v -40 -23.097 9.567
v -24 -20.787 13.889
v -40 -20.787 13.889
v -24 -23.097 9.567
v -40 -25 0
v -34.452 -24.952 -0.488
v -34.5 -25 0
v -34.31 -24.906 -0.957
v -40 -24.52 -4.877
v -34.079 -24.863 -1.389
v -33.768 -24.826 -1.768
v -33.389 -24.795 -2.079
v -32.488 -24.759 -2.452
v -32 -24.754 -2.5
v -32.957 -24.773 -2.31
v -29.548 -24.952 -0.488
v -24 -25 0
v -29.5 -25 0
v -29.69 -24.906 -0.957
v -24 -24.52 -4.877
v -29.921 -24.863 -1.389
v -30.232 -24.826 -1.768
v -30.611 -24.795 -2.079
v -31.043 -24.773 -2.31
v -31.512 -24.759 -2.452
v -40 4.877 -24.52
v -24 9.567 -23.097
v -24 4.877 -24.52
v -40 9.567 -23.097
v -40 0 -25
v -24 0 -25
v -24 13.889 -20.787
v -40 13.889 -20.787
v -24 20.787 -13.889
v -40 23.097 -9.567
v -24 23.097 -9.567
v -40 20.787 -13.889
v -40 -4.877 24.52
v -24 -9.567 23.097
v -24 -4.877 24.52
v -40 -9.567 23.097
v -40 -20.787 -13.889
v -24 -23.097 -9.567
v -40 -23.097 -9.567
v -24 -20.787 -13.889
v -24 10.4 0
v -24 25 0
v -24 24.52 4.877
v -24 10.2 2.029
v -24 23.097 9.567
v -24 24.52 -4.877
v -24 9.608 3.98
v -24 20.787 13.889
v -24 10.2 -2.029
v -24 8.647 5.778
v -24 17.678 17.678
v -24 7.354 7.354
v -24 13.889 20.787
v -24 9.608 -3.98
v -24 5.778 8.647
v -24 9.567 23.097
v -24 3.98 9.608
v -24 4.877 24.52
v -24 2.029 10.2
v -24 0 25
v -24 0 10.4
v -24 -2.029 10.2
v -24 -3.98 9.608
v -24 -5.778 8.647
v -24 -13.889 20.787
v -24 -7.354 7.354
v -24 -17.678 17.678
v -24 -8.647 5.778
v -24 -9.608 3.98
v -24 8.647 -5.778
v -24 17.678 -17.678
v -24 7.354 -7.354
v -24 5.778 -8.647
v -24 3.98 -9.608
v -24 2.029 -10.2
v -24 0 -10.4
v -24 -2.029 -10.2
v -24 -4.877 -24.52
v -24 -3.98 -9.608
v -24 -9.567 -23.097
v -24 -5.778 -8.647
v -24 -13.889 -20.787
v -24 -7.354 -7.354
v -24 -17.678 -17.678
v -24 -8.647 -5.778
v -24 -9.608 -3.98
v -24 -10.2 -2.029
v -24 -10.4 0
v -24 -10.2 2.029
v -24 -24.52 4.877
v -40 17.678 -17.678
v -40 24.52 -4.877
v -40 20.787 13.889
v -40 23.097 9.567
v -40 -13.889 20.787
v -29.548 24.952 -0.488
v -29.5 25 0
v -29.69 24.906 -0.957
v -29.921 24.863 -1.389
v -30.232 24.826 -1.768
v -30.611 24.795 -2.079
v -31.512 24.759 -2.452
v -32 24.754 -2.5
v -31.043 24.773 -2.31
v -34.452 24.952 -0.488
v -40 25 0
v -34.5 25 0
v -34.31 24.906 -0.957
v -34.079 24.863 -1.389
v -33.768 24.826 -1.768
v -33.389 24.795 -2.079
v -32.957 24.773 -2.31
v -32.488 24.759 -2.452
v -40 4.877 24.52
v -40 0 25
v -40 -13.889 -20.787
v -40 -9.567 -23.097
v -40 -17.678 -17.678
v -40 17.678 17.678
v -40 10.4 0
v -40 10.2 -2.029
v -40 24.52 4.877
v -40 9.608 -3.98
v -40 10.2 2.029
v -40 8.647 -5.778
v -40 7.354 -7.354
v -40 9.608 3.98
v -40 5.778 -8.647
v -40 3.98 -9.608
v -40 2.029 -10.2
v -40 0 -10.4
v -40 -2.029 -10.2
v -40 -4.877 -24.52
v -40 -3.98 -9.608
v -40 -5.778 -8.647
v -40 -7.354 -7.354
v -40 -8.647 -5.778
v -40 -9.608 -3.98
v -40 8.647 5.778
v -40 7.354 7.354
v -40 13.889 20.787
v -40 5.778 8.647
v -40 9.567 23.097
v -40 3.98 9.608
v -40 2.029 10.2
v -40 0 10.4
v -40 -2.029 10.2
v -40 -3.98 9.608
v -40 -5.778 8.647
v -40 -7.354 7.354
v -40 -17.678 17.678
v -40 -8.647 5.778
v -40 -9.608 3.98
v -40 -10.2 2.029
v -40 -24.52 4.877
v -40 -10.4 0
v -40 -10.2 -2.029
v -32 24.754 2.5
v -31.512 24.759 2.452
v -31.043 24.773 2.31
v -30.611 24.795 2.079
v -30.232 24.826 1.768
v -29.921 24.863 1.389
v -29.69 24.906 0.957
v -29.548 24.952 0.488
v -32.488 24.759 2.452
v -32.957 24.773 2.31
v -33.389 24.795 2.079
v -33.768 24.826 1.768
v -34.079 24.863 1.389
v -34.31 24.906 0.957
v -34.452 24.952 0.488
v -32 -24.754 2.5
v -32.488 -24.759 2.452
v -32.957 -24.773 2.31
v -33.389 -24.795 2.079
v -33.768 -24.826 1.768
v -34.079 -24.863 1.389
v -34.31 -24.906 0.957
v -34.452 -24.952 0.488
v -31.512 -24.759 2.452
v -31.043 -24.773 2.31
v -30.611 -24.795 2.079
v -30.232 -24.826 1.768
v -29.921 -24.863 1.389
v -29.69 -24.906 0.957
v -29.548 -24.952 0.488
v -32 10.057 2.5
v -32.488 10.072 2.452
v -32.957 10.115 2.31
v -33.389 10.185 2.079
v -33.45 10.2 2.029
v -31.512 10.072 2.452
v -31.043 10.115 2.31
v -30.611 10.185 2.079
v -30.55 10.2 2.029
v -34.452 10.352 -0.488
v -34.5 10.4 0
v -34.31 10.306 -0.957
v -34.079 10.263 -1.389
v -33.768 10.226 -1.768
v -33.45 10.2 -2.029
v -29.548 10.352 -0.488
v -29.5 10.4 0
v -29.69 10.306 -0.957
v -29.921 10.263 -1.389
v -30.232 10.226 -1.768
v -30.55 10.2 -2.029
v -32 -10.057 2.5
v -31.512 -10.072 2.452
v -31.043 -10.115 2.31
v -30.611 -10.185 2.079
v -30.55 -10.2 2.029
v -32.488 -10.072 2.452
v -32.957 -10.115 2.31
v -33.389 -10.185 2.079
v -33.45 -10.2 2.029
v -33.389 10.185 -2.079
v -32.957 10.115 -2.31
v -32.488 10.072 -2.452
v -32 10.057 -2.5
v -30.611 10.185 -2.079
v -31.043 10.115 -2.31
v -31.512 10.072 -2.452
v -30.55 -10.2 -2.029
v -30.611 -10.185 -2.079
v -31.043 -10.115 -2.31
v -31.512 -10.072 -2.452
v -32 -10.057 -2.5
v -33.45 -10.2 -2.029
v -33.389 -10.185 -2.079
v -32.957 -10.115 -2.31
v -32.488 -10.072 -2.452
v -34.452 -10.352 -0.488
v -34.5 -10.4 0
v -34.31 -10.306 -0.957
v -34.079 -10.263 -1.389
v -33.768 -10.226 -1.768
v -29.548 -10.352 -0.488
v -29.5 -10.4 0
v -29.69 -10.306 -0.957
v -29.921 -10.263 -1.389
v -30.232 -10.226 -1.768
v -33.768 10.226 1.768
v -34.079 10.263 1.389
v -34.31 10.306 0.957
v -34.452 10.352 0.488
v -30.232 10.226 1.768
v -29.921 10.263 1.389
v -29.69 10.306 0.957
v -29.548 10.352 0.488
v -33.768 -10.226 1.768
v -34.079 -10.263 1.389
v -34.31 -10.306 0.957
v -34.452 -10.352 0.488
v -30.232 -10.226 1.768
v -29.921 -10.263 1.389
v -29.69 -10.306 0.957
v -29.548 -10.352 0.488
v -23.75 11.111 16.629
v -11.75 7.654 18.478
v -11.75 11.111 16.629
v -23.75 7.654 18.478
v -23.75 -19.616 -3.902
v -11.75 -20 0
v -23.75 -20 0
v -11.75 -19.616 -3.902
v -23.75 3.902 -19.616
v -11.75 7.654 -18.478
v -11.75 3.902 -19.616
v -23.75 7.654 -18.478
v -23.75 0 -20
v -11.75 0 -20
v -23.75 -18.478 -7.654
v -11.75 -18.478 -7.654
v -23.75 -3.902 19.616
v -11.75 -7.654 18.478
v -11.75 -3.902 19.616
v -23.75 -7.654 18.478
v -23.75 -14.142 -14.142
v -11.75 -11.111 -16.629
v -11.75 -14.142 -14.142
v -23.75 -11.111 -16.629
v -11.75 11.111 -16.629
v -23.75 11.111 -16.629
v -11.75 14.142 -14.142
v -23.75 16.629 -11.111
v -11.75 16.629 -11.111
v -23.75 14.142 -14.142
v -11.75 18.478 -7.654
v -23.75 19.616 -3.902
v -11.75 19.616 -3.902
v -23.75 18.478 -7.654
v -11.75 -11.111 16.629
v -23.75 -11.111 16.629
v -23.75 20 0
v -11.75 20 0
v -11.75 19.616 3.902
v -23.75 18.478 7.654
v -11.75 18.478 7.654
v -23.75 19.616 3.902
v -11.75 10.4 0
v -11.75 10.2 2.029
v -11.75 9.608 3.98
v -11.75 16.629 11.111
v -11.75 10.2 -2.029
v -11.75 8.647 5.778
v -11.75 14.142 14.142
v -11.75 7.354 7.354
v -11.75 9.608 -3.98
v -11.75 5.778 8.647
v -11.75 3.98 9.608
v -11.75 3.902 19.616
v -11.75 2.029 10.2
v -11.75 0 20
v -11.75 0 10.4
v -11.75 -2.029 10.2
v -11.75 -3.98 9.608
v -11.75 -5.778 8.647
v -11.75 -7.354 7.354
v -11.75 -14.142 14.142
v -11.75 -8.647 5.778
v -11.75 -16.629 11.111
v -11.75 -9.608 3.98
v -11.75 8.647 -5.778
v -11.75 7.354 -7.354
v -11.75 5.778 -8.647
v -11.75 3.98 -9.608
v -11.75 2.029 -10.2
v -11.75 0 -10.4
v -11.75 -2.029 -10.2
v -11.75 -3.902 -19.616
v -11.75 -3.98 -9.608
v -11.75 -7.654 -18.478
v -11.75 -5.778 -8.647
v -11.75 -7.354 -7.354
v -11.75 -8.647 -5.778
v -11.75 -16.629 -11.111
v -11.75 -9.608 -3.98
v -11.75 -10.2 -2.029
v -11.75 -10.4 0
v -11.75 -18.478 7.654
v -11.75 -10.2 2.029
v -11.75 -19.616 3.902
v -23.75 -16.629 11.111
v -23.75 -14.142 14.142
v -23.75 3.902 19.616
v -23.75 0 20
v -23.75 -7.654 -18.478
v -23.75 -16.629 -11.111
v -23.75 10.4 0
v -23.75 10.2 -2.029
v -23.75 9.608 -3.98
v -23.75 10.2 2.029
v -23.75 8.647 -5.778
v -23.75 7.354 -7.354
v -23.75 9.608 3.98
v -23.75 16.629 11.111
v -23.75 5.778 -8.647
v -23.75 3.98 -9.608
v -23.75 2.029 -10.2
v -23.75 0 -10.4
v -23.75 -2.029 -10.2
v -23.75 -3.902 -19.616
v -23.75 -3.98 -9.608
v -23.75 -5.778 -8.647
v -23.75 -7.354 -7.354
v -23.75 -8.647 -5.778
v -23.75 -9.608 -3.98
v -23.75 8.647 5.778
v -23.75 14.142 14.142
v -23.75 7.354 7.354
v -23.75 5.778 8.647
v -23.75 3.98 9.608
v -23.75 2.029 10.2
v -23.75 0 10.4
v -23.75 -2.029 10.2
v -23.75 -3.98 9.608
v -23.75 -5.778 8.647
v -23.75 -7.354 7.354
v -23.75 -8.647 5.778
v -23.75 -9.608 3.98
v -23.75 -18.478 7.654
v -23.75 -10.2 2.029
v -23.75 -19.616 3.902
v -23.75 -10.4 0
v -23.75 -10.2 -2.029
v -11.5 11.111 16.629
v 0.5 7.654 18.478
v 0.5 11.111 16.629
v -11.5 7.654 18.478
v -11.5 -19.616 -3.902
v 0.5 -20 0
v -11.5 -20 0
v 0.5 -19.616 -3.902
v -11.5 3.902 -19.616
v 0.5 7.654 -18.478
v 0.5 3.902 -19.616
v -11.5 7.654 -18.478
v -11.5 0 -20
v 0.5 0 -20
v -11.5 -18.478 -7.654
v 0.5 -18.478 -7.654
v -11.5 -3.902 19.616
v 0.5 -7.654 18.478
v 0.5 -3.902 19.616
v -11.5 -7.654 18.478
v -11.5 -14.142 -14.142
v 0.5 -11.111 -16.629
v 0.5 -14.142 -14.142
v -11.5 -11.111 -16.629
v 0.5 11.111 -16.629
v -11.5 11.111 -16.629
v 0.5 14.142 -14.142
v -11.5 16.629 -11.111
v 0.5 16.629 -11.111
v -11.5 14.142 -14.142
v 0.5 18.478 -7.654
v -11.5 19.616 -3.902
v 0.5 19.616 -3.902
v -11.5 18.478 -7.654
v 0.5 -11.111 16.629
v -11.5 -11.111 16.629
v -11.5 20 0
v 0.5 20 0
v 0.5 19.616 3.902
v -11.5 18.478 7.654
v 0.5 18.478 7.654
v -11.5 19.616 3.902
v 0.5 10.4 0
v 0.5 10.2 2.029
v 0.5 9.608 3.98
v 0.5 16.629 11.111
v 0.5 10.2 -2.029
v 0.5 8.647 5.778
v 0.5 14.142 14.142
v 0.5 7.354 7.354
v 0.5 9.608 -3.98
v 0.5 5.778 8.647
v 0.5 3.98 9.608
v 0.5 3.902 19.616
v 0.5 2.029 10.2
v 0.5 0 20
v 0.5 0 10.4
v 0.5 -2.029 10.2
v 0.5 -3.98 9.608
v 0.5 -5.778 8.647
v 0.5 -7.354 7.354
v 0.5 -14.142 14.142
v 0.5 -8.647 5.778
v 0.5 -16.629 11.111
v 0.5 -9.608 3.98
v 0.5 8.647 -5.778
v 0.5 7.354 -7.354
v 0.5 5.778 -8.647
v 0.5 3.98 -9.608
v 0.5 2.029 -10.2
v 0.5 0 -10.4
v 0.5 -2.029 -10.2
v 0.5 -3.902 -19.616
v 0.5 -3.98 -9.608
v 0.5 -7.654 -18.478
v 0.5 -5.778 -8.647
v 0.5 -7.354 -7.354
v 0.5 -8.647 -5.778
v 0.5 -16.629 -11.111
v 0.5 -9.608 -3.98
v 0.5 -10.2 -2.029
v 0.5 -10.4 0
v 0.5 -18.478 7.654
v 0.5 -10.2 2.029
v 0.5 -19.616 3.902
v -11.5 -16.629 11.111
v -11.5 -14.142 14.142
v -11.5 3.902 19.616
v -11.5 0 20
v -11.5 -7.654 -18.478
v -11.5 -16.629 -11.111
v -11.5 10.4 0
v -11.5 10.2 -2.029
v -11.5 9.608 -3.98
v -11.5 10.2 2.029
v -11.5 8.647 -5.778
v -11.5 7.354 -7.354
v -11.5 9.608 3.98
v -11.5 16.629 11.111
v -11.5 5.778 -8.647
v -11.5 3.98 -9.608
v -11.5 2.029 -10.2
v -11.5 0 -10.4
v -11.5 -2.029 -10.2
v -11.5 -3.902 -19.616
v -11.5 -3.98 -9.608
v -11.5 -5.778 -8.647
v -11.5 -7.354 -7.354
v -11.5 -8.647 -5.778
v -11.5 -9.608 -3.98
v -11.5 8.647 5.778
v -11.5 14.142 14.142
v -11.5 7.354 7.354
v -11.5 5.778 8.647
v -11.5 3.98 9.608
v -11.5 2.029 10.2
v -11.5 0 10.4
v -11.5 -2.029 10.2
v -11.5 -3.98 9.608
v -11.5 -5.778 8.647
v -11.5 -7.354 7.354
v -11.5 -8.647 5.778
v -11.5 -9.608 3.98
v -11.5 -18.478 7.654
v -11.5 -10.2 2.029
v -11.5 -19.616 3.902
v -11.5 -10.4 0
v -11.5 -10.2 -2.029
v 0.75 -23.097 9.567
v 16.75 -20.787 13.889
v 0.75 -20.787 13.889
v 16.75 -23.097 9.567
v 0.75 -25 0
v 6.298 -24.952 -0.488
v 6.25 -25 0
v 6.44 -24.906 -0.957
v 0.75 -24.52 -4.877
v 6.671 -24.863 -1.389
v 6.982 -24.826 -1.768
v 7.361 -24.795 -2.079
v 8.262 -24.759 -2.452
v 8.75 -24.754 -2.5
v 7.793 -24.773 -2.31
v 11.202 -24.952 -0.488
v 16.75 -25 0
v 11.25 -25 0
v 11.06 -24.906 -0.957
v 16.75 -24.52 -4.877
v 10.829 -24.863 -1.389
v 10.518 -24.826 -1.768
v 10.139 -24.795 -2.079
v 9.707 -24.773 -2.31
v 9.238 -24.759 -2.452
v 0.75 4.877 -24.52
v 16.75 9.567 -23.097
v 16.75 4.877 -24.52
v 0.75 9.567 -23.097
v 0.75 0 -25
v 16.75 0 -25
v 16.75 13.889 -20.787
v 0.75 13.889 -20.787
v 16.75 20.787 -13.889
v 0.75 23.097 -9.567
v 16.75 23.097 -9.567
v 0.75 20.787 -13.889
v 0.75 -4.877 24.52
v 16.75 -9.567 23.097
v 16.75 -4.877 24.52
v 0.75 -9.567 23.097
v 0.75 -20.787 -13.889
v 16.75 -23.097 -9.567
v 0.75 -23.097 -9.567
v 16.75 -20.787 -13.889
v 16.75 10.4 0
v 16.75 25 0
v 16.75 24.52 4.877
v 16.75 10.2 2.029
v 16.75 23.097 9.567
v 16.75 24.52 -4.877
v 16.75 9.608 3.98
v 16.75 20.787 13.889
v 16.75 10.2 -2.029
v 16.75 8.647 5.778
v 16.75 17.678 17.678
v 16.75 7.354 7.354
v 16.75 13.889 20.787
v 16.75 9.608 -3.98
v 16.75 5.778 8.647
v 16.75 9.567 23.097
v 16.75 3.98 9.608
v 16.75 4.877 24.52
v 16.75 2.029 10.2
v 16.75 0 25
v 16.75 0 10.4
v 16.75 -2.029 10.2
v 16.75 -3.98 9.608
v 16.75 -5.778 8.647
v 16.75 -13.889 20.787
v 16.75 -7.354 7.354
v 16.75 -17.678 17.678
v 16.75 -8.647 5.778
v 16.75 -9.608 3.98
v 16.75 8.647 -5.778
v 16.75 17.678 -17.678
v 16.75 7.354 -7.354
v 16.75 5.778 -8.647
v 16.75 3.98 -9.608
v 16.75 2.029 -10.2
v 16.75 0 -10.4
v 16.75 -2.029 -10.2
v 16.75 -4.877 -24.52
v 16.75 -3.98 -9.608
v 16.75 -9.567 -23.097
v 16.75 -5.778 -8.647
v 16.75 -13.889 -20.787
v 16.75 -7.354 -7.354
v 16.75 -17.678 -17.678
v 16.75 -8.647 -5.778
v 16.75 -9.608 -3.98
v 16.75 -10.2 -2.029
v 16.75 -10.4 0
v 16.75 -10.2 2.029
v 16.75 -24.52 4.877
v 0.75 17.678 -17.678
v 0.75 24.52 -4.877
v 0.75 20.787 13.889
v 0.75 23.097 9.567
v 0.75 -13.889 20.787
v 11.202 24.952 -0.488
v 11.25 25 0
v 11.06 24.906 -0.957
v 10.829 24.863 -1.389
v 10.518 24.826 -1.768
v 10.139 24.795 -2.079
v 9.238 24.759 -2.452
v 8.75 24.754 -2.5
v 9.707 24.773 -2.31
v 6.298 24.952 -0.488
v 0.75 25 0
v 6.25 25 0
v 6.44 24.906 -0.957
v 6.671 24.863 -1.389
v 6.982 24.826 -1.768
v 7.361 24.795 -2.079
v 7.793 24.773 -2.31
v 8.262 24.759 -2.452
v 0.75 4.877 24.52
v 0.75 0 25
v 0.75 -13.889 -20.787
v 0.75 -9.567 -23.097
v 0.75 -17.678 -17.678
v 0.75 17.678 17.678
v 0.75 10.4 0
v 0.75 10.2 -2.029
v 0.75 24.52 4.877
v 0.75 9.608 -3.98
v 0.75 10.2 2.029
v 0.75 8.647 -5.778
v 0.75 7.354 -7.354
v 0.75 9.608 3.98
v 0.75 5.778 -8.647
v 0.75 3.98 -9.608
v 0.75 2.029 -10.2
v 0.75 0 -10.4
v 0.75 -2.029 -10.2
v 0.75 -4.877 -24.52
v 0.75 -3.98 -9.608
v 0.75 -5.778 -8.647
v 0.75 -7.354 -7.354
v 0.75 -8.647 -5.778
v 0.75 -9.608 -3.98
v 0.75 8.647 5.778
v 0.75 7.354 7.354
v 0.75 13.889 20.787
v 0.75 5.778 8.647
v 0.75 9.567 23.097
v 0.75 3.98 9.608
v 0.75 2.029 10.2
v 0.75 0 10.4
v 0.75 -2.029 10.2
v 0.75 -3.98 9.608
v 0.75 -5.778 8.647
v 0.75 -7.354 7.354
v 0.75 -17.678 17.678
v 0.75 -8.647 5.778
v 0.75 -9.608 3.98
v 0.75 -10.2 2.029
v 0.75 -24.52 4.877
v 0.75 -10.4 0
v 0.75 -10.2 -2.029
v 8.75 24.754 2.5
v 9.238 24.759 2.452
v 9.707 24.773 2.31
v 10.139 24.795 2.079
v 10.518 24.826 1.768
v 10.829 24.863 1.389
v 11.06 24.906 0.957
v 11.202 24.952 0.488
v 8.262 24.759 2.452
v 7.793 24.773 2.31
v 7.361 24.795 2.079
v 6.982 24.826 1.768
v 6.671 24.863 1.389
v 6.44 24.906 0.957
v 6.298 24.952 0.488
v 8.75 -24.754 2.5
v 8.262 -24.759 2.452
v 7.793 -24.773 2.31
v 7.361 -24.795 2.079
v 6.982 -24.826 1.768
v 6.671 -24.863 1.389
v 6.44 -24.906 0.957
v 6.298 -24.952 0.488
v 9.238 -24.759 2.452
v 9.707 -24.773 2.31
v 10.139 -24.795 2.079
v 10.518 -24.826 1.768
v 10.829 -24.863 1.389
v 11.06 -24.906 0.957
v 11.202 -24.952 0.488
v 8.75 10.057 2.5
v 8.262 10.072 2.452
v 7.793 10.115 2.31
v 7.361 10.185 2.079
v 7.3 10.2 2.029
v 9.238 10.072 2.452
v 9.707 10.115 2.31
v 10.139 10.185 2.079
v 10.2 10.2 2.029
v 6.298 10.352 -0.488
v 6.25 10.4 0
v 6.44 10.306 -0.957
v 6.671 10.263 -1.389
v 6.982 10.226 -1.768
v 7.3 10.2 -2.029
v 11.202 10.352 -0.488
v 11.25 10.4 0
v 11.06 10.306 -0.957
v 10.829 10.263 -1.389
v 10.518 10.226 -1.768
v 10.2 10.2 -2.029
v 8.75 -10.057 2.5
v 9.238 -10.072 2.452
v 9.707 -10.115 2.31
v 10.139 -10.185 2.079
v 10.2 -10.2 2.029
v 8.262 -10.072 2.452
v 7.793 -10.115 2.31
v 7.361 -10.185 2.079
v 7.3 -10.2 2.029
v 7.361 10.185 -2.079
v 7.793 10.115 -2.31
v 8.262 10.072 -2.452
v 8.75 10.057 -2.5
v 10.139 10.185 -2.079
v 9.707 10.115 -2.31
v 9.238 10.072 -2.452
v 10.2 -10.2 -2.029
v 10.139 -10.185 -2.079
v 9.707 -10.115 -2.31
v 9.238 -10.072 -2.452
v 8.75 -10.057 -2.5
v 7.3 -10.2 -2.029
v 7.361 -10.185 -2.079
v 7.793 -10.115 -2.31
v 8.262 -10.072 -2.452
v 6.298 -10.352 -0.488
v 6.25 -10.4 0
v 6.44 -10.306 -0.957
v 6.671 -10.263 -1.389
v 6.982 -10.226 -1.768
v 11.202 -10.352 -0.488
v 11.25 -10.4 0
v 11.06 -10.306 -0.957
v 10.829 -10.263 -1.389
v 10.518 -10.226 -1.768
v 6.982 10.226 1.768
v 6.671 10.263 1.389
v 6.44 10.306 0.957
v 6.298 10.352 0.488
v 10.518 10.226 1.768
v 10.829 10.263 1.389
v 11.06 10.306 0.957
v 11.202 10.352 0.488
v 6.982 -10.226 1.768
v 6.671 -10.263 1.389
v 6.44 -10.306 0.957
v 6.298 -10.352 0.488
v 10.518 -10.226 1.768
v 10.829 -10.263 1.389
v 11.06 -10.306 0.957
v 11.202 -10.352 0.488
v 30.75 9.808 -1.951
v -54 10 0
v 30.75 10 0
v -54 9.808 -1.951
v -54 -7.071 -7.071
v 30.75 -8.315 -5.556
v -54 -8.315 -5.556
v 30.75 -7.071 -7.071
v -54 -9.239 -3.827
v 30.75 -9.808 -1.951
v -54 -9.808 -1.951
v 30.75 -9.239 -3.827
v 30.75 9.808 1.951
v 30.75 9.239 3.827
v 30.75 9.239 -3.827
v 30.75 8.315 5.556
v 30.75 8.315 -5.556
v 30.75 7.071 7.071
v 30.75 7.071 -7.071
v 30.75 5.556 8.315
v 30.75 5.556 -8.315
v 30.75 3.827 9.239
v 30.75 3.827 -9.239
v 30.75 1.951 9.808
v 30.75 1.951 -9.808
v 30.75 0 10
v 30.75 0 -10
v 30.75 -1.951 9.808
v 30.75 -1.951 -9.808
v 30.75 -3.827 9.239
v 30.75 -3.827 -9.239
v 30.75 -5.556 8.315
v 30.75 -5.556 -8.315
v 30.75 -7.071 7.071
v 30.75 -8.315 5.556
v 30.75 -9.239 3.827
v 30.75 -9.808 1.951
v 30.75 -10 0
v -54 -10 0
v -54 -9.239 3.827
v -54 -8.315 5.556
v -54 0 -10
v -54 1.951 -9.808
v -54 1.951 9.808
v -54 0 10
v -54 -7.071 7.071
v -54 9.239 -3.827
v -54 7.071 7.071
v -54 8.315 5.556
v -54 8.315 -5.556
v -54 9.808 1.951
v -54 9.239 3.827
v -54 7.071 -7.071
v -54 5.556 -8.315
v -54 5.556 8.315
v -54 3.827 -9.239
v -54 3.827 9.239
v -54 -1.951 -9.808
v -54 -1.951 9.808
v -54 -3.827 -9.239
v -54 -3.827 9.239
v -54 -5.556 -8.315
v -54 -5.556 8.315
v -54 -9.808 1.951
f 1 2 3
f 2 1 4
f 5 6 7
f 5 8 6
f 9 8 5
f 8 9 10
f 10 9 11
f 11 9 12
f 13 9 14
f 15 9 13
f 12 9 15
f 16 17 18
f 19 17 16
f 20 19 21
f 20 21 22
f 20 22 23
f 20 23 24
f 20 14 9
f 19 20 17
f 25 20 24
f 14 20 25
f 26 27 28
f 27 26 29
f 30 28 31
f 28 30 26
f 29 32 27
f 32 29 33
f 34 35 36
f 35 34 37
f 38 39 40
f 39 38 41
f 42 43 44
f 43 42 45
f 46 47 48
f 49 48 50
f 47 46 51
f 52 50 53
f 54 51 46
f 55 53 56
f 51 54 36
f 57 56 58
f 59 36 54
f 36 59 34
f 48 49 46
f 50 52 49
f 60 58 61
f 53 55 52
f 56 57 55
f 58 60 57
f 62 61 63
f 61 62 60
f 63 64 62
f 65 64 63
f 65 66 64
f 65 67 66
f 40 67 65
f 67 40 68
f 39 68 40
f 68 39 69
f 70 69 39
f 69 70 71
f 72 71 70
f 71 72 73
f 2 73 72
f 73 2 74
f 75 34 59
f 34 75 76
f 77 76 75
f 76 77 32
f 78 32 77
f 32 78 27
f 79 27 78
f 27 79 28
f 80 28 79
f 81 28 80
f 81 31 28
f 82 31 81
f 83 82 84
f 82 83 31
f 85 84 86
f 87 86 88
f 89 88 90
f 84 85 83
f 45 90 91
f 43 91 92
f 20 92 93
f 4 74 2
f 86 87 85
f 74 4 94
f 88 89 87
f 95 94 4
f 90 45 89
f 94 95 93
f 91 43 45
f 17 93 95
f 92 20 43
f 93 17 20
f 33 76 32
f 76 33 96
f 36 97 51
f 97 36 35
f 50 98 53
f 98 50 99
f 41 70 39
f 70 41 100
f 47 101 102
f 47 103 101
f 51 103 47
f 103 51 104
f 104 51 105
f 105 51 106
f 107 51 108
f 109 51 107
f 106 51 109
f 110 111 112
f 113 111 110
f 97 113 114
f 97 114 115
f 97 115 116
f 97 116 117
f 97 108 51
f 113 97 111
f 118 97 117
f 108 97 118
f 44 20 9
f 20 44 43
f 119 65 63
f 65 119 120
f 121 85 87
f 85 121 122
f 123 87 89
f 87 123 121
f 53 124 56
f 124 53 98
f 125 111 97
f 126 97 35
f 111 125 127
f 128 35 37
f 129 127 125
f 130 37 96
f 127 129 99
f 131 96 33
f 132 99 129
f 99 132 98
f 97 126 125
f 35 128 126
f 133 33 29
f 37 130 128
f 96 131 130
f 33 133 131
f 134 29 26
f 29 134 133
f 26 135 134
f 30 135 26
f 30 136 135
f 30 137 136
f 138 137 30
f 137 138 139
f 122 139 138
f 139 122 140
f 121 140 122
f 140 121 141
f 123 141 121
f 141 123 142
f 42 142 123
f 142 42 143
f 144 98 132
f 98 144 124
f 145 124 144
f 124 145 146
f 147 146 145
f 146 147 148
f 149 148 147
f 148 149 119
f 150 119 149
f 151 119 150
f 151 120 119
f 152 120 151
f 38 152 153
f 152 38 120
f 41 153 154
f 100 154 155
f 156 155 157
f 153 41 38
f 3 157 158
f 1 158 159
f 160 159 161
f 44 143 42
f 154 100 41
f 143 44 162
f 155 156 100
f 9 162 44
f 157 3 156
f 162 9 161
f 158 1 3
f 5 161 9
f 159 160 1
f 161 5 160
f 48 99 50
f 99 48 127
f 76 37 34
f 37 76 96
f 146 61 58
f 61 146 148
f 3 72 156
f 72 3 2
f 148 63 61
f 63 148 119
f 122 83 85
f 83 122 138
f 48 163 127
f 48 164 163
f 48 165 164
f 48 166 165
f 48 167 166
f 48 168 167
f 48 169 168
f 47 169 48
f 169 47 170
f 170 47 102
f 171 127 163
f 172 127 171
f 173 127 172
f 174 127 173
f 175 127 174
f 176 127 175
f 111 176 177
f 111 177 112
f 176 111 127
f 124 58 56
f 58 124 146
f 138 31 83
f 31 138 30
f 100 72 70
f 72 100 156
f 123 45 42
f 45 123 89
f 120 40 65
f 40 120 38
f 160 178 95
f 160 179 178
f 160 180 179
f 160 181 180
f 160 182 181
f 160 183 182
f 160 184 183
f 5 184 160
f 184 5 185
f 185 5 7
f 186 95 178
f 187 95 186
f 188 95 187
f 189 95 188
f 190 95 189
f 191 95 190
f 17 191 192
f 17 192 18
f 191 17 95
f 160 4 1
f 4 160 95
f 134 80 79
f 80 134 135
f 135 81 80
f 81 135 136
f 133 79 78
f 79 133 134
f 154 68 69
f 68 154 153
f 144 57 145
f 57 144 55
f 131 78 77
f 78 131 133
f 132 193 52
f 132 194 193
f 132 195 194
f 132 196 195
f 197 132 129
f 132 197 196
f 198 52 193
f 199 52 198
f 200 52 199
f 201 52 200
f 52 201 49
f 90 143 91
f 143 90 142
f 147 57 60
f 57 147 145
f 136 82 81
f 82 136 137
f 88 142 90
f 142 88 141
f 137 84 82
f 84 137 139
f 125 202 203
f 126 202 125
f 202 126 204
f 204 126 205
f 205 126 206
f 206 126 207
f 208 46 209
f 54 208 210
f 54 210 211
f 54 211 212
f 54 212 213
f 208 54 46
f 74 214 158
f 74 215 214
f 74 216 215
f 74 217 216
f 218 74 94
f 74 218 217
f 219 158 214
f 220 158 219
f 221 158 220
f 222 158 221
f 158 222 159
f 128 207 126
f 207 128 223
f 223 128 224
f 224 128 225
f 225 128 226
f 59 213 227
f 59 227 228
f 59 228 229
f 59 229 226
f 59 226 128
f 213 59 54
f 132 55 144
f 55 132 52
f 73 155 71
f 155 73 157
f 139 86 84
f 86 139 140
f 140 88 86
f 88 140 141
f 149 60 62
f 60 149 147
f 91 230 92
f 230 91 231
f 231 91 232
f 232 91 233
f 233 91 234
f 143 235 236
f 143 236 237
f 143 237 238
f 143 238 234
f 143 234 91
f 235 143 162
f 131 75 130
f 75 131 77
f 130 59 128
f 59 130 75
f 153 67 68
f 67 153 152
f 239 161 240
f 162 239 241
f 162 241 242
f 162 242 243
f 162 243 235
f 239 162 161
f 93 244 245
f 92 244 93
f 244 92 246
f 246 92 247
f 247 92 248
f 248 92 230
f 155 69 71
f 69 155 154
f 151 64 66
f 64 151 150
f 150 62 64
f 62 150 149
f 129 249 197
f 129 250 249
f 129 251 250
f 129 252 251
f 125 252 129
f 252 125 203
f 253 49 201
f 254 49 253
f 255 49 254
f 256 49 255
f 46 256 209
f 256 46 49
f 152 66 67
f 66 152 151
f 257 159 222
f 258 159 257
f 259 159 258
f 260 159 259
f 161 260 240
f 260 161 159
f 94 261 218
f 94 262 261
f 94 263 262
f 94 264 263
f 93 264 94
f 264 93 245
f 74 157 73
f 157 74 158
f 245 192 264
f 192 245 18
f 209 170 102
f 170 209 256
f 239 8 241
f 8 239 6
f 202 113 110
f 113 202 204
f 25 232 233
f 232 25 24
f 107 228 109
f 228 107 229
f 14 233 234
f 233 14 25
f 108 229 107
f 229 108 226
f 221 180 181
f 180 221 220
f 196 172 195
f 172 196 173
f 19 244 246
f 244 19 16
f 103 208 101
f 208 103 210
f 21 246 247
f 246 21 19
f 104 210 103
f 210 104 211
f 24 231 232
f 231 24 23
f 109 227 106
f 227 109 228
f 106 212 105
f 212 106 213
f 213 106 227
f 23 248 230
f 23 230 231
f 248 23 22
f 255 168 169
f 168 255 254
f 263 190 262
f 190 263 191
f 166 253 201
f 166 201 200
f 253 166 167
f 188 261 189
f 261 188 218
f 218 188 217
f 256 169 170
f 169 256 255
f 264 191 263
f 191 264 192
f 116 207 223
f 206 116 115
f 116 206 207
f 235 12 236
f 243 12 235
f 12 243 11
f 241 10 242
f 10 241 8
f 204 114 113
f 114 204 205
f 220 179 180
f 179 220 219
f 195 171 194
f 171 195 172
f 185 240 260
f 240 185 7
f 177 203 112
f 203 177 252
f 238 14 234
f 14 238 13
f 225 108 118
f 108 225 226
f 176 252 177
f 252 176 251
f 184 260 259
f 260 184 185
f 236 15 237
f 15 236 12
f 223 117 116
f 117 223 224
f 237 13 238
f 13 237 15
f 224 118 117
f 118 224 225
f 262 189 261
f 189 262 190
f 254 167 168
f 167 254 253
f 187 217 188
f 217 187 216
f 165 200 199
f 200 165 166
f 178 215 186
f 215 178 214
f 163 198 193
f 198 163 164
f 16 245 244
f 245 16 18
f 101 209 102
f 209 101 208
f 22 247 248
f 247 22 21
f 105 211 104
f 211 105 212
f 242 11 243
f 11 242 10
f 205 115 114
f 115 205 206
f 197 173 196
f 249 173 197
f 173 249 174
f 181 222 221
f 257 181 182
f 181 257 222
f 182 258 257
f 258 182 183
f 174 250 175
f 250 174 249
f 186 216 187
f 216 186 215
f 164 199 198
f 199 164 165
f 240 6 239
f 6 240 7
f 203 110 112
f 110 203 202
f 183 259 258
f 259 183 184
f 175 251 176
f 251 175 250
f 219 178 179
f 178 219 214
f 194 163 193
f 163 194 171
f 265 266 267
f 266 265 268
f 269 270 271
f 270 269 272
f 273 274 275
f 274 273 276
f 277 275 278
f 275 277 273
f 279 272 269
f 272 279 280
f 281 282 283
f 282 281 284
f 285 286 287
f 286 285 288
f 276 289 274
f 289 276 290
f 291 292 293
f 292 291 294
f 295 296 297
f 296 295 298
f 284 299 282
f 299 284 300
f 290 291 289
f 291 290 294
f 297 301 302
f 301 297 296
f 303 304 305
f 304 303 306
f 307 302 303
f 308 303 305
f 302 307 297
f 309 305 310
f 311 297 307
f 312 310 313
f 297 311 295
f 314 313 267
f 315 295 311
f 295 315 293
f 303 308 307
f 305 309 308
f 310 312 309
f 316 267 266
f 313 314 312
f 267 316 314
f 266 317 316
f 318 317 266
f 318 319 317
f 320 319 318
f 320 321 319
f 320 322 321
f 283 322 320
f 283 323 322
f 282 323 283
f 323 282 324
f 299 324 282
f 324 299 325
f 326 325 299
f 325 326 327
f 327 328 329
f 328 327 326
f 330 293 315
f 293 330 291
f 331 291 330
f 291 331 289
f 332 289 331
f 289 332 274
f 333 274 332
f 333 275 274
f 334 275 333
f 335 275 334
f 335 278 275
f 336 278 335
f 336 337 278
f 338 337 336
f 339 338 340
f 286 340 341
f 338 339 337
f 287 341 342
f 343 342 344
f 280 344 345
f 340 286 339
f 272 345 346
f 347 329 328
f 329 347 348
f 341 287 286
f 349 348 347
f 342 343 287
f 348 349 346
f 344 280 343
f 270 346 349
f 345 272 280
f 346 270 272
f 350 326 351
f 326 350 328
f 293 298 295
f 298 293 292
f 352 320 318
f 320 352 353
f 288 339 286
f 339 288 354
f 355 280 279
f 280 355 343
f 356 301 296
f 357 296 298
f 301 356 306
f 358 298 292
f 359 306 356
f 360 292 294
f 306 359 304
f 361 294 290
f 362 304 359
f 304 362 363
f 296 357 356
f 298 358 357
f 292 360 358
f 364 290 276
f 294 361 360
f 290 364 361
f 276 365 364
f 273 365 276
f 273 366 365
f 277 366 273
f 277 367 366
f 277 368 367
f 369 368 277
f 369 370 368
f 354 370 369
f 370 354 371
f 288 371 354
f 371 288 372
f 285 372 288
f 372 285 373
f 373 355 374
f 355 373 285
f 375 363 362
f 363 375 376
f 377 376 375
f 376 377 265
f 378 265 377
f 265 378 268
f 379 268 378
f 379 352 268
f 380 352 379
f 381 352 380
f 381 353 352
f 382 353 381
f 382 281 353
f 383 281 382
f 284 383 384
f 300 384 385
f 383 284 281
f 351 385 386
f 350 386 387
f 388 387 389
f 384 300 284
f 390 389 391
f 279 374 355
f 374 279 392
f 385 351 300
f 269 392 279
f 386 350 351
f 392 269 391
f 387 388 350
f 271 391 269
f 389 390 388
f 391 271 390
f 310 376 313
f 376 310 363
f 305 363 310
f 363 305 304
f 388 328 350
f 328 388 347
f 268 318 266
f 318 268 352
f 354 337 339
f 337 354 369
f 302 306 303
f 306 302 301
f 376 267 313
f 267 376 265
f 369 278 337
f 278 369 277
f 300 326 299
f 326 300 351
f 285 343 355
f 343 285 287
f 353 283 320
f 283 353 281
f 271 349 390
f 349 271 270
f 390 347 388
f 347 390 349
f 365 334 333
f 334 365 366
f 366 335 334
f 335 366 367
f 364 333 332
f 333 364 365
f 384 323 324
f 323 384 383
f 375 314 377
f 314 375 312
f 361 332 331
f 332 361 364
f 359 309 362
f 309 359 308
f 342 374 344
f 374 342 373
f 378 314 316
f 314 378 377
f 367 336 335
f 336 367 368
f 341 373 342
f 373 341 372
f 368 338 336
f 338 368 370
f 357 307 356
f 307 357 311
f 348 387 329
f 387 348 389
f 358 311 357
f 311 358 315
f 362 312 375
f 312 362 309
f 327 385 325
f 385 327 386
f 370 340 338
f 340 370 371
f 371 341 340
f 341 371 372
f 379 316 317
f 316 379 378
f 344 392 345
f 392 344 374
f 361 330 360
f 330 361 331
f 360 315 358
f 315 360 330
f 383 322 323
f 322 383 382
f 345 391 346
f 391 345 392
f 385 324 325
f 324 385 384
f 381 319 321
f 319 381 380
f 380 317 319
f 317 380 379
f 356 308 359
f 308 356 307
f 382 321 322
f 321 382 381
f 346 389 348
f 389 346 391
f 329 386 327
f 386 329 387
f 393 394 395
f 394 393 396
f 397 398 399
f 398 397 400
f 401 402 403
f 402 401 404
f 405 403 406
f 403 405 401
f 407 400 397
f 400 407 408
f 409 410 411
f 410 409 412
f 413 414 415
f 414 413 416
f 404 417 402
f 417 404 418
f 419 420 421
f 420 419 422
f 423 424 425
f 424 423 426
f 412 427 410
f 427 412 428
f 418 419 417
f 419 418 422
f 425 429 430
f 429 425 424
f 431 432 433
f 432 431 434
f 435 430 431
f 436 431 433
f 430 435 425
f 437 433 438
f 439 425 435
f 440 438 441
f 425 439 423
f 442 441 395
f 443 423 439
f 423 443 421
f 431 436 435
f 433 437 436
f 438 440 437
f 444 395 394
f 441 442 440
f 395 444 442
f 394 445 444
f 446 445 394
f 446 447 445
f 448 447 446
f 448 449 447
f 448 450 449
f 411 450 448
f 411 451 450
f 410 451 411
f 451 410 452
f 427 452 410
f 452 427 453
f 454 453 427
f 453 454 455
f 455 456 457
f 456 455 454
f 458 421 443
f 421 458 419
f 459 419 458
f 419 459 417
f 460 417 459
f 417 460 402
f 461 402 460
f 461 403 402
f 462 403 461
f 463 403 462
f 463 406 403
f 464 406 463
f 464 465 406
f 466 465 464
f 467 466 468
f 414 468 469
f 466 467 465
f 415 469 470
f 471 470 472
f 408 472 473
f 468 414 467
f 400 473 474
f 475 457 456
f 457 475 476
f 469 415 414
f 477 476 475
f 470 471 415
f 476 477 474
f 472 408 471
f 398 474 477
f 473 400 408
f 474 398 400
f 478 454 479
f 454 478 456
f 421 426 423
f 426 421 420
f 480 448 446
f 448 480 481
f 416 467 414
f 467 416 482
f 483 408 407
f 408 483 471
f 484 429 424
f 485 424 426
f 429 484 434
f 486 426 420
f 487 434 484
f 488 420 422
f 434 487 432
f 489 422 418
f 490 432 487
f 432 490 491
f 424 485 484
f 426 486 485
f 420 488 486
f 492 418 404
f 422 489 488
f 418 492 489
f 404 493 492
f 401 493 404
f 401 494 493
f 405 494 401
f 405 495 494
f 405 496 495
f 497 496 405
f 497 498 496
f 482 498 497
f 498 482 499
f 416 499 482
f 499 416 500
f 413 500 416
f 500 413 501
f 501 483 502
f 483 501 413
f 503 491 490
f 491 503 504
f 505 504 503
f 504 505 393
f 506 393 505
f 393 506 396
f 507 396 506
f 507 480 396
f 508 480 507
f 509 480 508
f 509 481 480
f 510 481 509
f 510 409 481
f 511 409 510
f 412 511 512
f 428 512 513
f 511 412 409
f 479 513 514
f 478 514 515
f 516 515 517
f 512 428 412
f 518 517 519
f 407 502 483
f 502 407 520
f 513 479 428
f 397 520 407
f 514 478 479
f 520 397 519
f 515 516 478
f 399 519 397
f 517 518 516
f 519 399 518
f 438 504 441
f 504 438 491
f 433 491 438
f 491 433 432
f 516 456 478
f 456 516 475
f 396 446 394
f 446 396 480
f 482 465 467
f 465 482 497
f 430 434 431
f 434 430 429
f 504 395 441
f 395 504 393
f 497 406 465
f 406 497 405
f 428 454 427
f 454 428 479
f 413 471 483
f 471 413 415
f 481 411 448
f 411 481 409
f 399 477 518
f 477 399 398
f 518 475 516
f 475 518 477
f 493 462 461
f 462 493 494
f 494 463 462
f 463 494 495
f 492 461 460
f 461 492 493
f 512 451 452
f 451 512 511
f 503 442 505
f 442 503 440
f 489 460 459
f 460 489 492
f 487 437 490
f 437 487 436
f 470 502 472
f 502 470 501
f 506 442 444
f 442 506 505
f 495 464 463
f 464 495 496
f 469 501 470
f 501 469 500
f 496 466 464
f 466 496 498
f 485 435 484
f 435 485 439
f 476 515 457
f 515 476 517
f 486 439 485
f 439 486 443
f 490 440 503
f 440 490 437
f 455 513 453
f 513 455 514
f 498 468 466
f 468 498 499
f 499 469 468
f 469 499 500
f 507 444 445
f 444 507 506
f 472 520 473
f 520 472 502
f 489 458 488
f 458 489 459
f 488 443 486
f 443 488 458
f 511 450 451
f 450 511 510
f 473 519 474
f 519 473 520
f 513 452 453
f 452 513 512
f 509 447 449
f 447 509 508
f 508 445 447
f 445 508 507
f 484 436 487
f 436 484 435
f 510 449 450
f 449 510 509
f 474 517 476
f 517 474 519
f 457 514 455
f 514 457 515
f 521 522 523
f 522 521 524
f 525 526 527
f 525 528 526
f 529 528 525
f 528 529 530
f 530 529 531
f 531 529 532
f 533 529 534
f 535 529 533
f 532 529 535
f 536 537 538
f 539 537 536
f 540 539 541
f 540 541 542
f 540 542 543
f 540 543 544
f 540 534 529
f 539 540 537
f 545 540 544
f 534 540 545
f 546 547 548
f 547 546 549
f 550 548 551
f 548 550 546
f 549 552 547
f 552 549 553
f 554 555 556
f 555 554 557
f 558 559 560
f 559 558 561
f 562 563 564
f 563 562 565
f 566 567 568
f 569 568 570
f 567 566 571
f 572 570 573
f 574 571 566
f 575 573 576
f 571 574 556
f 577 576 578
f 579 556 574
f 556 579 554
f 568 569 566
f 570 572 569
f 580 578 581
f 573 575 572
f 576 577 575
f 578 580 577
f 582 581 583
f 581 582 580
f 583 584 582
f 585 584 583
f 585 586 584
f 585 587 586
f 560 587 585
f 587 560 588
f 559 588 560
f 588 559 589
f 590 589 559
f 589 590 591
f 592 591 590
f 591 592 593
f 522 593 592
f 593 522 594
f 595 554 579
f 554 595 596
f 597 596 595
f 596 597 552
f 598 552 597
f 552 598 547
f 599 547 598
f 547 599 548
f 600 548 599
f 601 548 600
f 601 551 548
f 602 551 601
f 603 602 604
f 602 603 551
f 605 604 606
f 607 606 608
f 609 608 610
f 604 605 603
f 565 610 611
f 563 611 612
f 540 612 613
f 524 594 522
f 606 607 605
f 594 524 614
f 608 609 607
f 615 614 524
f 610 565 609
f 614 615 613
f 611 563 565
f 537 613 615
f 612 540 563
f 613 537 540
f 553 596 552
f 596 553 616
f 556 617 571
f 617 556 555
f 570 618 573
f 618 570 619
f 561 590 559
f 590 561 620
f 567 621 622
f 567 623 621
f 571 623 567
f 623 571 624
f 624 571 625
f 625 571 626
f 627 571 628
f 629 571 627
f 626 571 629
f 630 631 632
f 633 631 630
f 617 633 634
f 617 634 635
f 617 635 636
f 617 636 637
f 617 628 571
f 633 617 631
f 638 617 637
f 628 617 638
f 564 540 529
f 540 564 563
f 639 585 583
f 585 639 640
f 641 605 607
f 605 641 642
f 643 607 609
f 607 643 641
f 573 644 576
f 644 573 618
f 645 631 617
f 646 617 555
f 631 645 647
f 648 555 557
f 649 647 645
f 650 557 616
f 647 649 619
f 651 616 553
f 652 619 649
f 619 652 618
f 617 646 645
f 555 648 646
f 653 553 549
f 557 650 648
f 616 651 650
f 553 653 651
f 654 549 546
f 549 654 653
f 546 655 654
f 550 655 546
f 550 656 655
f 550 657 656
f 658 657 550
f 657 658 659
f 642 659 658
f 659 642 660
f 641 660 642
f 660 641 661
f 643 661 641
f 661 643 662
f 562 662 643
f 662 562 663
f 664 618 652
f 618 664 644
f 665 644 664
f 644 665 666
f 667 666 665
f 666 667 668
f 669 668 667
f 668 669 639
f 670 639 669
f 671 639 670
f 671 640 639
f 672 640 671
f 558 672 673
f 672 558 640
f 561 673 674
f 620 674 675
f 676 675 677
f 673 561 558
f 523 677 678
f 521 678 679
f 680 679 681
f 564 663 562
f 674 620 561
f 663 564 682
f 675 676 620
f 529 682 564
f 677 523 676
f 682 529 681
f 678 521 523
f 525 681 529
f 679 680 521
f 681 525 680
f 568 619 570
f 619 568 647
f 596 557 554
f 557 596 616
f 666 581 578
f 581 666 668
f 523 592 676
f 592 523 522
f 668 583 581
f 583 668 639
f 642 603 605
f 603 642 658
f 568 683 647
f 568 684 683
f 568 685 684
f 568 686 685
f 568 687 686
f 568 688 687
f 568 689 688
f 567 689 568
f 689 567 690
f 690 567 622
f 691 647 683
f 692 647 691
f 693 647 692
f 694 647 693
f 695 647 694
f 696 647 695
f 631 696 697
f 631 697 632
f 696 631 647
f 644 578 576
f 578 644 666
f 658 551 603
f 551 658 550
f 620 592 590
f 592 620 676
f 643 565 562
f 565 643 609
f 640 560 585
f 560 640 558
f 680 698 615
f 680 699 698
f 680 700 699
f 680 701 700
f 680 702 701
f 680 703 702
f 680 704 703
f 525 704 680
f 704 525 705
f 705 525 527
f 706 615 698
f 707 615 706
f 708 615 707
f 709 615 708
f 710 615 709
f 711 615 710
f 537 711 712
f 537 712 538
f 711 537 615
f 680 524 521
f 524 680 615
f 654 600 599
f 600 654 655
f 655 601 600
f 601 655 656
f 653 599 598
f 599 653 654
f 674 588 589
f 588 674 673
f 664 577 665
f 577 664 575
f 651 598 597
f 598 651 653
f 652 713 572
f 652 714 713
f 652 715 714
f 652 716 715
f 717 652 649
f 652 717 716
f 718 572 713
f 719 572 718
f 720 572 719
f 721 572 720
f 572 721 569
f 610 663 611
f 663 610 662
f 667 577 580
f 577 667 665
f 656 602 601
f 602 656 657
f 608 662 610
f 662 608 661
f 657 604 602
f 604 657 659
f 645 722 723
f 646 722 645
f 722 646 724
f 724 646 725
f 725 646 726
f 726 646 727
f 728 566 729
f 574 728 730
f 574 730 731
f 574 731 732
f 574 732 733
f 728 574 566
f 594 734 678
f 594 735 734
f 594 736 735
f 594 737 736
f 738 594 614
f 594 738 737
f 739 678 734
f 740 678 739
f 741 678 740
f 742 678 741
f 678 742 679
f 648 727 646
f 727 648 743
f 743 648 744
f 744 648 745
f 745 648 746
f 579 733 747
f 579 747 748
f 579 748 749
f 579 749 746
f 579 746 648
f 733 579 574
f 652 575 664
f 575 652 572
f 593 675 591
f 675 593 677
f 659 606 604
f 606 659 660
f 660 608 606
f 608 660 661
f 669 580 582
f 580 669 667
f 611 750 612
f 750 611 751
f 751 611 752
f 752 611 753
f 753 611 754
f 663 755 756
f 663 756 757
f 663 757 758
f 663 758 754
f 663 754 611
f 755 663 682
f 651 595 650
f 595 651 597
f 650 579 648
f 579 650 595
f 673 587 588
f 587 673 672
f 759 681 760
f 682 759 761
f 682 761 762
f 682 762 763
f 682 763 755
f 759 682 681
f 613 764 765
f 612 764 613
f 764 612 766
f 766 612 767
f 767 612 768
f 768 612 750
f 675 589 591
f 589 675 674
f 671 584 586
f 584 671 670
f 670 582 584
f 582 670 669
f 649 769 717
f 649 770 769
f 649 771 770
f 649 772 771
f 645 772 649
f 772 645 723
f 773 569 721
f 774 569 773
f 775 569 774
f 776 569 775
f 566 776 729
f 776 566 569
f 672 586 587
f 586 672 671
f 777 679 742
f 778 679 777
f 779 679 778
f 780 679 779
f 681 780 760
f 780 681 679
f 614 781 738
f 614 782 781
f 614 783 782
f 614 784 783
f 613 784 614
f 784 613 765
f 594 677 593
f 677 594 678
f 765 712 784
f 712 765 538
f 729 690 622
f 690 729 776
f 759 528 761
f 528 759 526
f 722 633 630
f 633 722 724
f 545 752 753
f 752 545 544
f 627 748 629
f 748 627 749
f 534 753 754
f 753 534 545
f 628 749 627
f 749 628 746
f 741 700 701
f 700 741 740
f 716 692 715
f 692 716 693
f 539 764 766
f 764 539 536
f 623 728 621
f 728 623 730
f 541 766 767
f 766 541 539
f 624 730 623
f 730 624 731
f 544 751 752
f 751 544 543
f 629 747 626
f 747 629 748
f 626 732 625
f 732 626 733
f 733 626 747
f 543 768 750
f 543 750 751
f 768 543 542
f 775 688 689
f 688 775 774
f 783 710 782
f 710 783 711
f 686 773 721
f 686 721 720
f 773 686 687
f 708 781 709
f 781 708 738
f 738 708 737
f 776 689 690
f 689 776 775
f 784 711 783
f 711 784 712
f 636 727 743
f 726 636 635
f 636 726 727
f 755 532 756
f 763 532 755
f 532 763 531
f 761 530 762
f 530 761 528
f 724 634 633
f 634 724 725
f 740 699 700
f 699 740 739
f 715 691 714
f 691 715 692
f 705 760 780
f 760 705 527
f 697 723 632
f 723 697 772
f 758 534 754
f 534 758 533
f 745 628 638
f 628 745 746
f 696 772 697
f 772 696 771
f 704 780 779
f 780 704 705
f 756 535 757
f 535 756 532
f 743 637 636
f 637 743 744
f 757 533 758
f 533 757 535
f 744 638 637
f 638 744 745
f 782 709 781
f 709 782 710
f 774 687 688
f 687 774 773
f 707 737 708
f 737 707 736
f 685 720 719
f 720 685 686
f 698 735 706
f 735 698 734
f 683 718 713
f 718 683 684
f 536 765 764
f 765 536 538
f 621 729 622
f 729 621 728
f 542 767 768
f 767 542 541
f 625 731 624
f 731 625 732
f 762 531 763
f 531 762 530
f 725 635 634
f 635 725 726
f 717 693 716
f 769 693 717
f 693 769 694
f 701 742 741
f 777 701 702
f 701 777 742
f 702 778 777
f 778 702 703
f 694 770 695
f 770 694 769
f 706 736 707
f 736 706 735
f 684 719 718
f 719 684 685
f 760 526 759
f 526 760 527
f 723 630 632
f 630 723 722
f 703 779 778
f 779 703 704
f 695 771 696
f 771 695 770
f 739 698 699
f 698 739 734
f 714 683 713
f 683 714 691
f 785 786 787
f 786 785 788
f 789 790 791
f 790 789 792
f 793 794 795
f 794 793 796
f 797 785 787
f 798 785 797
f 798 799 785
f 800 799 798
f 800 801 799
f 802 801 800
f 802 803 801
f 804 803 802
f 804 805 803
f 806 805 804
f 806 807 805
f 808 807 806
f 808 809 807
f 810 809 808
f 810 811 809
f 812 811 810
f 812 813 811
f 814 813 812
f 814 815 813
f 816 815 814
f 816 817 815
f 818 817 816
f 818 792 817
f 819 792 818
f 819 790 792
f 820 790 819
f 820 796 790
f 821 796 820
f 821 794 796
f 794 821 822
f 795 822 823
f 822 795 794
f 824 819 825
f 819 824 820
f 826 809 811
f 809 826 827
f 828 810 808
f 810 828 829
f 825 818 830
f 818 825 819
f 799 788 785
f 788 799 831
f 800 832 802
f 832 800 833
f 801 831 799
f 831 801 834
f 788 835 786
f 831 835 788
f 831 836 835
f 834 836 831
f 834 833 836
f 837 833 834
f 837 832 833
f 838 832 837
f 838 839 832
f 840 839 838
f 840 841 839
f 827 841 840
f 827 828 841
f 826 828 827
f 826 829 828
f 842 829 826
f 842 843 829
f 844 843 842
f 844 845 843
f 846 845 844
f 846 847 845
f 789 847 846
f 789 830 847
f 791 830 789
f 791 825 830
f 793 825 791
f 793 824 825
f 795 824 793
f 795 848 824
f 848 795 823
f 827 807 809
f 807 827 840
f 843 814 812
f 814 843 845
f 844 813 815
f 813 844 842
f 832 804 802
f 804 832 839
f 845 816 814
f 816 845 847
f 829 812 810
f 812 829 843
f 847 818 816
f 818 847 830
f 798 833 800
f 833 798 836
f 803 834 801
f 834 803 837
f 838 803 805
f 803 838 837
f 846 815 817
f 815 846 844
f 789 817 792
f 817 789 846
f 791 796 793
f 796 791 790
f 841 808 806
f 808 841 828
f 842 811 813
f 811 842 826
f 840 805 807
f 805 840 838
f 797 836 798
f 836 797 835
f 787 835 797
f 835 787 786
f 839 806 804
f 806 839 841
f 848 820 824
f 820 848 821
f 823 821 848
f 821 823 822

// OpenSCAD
$fn = 32;

// ------------------------------------------------------------------------
// Shaft with rings and collars: d20 shaft, 4 rings
// Every part is its own module, assembly() places them once.
// ------------------------------------------------------------------------

// --- part 1 ---
module shaft() {
  translate([0, 0, -42.375]) cylinder(h = 84.75, d = 20);
}

// --- part 2 ---
module collar_a() {
  difference() {
    cylinder(h = 16, d = 50);
    translate([0, 0, -1]) cylinder(h = 18, d = 20.8);
    translate([0, 0, 8]) rotate([90, 0, 0]) cylinder(h = 52, d = 5, center = true);
  }
}

// --- part 3 ---
module spacer_a() {
  difference() {
      translate([0, 0, 0]) cylinder(h = 12, d = 40);
      translate([0, 0, -1]) cylinder(h = 14, d = 20.8);
    }
}

// --- part 4 ---
module spacer_b() {
  difference() {
      translate([0, 0, 0]) cylinder(h = 12, d = 40);
      translate([0, 0, -1]) cylinder(h = 14, d = 20.8);
    }
}

// --- part 5 ---
module collar_b() {
  difference() {
    cylinder(h = 16, d = 50);
    translate([0, 0, -1]) cylinder(h = 18, d = 20.8);
    translate([0, 0, 8]) rotate([90, 0, 0]) cylinder(h = 52, d = 5, center = true);
  }
}

// --- assembly ---
module assembly() {
  translate([-11.625, 0, 0]) rotate([0, 90, 0]) shaft();
  translate([-40, 0, 0]) rotate([0, 90, 0]) collar_a();
  translate([-23.75, 0, 0]) rotate([0, 90, 0]) spacer_a();
  translate([-11.5, 0, 0]) rotate([0, 90, 0]) spacer_b();
  translate([0.75, 0, 0]) rotate([0, 90, 0]) collar_b();
}

assembly();
